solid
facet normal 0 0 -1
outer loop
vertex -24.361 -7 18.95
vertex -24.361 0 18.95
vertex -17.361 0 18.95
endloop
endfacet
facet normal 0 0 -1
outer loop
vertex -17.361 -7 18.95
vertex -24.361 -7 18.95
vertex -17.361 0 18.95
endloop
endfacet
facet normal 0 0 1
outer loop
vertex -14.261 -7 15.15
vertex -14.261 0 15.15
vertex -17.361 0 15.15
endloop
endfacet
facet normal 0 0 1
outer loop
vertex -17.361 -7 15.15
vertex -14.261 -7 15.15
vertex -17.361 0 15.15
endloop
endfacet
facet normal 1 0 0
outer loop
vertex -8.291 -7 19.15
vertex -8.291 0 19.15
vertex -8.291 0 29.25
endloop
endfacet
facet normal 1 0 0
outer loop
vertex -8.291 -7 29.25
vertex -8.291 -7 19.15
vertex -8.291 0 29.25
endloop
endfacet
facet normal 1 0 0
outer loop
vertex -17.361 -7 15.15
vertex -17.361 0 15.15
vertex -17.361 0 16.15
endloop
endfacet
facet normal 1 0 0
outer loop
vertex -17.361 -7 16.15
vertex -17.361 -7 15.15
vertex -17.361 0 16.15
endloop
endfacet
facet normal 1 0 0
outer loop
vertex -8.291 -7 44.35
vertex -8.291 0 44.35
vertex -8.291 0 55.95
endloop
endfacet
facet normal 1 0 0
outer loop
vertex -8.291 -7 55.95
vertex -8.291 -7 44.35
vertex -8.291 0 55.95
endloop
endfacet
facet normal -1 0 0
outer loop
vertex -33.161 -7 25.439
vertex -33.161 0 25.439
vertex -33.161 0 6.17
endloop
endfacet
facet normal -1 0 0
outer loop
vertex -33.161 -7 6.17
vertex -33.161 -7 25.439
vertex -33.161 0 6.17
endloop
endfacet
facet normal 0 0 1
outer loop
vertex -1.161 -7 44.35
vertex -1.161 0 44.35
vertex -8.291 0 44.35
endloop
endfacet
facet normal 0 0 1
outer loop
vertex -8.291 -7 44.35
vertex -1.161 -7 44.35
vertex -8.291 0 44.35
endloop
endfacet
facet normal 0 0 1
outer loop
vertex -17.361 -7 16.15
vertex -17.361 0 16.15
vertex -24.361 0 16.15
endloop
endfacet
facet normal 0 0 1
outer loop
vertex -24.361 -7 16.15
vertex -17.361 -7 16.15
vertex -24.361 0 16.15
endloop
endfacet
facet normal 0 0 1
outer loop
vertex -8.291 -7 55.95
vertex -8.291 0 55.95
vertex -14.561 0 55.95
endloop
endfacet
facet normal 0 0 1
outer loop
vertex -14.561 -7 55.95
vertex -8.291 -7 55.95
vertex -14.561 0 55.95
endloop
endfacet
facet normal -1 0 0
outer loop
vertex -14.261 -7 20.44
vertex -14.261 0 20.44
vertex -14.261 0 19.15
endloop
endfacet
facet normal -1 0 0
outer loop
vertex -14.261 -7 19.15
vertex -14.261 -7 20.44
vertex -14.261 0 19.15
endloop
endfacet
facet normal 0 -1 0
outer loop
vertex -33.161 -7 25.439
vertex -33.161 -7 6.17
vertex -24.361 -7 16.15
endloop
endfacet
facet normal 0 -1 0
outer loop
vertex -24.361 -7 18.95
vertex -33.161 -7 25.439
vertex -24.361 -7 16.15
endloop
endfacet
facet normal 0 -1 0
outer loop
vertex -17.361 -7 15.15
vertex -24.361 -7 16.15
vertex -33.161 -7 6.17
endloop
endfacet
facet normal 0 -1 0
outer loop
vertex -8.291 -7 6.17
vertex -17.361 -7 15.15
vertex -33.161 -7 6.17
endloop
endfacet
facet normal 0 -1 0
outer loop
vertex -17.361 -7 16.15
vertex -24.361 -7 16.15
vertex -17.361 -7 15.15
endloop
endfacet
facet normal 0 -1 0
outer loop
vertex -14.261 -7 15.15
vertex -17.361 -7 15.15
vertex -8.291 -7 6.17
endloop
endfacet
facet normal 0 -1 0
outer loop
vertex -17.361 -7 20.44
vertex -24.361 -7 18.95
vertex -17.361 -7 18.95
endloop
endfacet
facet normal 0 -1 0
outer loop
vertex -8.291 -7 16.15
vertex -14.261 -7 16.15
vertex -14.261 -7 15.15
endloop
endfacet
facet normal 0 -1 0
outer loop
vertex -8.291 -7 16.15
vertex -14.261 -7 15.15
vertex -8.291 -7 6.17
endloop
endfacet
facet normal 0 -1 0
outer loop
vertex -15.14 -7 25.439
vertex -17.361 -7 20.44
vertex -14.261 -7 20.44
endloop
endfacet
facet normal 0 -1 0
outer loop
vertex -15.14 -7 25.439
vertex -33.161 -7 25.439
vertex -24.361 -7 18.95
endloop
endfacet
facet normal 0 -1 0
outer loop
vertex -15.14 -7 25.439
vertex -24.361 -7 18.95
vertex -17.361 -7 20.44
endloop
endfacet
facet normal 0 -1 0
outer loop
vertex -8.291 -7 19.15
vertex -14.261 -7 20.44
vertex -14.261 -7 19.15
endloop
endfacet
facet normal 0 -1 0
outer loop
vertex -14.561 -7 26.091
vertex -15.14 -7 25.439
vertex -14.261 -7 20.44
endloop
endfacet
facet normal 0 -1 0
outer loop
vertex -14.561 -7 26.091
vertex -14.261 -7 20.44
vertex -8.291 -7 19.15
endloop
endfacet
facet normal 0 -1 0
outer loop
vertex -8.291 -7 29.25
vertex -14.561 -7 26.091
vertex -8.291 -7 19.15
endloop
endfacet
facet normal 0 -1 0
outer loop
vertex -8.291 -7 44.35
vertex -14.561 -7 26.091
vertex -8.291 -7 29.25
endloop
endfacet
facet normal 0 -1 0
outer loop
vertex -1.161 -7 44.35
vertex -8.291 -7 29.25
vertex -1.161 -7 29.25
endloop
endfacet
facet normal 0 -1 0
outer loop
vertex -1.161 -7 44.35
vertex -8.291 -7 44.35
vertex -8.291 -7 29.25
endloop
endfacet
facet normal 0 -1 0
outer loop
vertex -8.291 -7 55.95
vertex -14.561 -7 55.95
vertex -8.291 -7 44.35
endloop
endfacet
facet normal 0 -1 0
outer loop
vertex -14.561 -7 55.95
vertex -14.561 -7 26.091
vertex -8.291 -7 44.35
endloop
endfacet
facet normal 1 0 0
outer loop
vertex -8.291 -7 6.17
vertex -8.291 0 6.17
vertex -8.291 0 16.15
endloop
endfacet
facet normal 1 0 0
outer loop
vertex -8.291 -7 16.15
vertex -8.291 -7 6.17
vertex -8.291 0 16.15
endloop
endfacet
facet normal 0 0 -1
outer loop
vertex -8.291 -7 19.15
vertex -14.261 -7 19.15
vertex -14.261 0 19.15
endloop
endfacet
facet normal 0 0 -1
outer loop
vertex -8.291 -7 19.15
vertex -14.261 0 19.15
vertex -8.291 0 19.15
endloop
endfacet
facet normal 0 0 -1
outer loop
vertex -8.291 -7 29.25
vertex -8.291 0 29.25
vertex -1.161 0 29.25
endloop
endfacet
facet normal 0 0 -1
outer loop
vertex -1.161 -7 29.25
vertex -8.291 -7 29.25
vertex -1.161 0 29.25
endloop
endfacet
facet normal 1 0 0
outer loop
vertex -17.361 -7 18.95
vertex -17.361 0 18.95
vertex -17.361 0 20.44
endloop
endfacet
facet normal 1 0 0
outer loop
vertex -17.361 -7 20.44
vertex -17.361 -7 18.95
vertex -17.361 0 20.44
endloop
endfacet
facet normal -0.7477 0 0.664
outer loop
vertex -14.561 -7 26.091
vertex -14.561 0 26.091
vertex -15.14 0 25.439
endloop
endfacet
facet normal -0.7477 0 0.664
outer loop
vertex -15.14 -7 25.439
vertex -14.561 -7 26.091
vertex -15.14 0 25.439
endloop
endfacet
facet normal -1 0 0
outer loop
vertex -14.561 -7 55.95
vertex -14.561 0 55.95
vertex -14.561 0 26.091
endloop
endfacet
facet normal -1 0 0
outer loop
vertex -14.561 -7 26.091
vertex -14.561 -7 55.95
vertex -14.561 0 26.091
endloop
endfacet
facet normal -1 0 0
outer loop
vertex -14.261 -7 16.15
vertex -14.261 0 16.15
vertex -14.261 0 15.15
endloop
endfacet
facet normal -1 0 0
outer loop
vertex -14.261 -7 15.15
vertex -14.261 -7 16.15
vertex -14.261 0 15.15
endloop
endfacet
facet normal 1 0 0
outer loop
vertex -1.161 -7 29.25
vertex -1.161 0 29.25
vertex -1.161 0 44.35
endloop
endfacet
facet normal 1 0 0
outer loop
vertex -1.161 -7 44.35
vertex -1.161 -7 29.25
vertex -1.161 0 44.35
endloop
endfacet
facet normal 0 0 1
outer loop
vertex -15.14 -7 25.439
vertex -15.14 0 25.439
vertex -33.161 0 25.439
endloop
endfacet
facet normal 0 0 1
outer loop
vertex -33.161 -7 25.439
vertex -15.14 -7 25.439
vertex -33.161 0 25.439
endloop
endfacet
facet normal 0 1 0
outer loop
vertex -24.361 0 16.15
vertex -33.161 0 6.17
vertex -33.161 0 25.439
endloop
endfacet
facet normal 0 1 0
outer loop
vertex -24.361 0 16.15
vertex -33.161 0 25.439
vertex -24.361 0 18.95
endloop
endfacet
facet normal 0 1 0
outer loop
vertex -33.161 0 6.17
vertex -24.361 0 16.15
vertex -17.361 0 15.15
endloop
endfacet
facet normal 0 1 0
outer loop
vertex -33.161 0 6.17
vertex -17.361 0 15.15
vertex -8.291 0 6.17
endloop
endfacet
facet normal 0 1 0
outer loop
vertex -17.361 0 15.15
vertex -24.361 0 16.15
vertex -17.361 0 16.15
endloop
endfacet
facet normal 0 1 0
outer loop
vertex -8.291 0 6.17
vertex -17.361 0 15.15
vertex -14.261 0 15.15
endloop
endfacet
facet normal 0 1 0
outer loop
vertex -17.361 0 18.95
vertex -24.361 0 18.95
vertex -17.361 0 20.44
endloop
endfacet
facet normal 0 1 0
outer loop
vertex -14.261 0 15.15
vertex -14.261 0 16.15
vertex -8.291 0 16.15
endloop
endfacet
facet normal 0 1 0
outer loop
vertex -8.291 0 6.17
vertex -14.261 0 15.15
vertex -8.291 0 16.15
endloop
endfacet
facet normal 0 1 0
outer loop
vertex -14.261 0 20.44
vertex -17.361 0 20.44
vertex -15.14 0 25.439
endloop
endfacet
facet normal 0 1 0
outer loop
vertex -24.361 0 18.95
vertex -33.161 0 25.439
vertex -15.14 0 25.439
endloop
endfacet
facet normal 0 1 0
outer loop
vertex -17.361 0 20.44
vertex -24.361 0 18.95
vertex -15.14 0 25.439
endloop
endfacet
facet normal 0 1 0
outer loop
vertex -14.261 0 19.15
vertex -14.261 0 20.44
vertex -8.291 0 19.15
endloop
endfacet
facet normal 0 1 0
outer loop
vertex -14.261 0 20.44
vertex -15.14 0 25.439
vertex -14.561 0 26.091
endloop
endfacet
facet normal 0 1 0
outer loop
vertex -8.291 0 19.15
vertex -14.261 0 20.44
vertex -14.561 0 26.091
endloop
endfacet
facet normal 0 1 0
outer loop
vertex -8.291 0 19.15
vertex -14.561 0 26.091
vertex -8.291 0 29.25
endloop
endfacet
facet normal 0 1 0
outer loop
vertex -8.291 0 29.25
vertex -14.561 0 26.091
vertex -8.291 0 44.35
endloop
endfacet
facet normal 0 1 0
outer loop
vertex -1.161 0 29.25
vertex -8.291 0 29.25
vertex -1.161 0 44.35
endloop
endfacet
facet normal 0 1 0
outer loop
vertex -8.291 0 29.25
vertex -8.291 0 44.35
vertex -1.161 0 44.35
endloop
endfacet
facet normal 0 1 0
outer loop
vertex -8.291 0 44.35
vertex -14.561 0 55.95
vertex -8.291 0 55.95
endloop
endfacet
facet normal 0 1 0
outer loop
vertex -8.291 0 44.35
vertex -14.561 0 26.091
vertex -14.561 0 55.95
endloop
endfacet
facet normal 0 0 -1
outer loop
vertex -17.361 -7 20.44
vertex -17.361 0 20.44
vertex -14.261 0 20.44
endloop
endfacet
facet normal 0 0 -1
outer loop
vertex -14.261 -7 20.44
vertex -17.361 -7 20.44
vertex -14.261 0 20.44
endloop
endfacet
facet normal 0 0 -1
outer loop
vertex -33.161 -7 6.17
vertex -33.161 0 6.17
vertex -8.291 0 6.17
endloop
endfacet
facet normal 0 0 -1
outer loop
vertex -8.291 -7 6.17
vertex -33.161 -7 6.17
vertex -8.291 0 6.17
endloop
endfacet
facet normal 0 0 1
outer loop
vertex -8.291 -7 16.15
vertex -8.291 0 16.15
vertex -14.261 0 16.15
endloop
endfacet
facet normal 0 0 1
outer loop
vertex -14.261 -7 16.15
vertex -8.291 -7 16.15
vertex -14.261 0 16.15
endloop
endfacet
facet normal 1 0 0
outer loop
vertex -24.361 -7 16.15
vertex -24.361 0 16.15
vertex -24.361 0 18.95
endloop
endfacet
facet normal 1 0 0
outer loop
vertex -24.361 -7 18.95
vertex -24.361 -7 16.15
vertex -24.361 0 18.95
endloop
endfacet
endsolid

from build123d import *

# Parameters (mm, degrees)
F1_DEPTH = 7


with BuildPart() as f1:
    # F0 (on Front) → F1 (new body)
    with BuildSketch(Plane.XZ):
        Polygon((-8.290611, 55.949569), (-14.560611, 55.949569), (-14.560611, 26.091313), (-15.139798, 25.439247), (-33.160611, 25.439247), (-33.160611, 6.169569), (-8.290611, 6.169569), (-8.290611, 16.149569), (-14.260611, 16.149569), (-14.260611, 15.149569), (-17.360611, 15.149569), (-17.360611, 16.149569), (-24.360611, 16.149569), (-24.360611, 18.949569), (-17.360611, 18.949569), (-17.360611, 20.439569), (-14.260611, 20.439569), (-14.260611, 19.149569), (-8.290611, 19.149569), (-8.290611, 29.249569), (-1.160611, 29.249569), (-1.160611, 44.349569), (-8.290611, 44.349569), align=None)
    extrude(amount=F1_DEPTH)


solid = f1.part
